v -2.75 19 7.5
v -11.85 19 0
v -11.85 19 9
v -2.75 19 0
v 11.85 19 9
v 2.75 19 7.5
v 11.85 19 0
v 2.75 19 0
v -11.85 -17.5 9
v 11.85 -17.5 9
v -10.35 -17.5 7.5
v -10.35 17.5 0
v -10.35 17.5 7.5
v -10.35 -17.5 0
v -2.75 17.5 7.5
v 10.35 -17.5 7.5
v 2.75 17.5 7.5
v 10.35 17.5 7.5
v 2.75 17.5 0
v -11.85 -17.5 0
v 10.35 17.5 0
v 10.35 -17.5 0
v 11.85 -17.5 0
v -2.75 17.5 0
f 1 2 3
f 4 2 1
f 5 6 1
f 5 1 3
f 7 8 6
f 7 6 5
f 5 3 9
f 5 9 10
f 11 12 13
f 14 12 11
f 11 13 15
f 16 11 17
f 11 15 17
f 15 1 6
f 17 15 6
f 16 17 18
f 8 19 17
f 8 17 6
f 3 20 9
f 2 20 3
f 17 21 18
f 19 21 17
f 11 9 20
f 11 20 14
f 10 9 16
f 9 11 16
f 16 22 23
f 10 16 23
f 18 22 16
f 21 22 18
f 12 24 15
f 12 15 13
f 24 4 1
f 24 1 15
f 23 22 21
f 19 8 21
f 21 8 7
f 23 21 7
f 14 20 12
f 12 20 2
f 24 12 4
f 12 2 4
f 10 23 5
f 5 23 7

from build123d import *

# Parameters (mm, degrees)
F1_W     = 23.7
F1_H     = 36.5
F2_DEPTH = 9
F3_DEPTH = 7.5


with BuildPart() as f2:
    # F1 (on Top) → F2 (new body)
    with BuildSketch(Plane.XY):
        with Locations((0, 0.75)):
            Rectangle(F1_W, F1_H)
    extrude(amount=F2_DEPTH)

    # F0 (on Top) → F3 (cut)
    with BuildSketch(Plane.XY):
        Polygon((-10.35, -17.5), (10.35, -17.5), (10.35, 17.5), (2.75, 17.5), (2.75, 19), (-2.75, 19), (-2.75, 17.5), (-10.35, 17.5), align=None)
    extrude(amount=F3_DEPTH, mode=Mode.SUBTRACT)


solid = f2.part
